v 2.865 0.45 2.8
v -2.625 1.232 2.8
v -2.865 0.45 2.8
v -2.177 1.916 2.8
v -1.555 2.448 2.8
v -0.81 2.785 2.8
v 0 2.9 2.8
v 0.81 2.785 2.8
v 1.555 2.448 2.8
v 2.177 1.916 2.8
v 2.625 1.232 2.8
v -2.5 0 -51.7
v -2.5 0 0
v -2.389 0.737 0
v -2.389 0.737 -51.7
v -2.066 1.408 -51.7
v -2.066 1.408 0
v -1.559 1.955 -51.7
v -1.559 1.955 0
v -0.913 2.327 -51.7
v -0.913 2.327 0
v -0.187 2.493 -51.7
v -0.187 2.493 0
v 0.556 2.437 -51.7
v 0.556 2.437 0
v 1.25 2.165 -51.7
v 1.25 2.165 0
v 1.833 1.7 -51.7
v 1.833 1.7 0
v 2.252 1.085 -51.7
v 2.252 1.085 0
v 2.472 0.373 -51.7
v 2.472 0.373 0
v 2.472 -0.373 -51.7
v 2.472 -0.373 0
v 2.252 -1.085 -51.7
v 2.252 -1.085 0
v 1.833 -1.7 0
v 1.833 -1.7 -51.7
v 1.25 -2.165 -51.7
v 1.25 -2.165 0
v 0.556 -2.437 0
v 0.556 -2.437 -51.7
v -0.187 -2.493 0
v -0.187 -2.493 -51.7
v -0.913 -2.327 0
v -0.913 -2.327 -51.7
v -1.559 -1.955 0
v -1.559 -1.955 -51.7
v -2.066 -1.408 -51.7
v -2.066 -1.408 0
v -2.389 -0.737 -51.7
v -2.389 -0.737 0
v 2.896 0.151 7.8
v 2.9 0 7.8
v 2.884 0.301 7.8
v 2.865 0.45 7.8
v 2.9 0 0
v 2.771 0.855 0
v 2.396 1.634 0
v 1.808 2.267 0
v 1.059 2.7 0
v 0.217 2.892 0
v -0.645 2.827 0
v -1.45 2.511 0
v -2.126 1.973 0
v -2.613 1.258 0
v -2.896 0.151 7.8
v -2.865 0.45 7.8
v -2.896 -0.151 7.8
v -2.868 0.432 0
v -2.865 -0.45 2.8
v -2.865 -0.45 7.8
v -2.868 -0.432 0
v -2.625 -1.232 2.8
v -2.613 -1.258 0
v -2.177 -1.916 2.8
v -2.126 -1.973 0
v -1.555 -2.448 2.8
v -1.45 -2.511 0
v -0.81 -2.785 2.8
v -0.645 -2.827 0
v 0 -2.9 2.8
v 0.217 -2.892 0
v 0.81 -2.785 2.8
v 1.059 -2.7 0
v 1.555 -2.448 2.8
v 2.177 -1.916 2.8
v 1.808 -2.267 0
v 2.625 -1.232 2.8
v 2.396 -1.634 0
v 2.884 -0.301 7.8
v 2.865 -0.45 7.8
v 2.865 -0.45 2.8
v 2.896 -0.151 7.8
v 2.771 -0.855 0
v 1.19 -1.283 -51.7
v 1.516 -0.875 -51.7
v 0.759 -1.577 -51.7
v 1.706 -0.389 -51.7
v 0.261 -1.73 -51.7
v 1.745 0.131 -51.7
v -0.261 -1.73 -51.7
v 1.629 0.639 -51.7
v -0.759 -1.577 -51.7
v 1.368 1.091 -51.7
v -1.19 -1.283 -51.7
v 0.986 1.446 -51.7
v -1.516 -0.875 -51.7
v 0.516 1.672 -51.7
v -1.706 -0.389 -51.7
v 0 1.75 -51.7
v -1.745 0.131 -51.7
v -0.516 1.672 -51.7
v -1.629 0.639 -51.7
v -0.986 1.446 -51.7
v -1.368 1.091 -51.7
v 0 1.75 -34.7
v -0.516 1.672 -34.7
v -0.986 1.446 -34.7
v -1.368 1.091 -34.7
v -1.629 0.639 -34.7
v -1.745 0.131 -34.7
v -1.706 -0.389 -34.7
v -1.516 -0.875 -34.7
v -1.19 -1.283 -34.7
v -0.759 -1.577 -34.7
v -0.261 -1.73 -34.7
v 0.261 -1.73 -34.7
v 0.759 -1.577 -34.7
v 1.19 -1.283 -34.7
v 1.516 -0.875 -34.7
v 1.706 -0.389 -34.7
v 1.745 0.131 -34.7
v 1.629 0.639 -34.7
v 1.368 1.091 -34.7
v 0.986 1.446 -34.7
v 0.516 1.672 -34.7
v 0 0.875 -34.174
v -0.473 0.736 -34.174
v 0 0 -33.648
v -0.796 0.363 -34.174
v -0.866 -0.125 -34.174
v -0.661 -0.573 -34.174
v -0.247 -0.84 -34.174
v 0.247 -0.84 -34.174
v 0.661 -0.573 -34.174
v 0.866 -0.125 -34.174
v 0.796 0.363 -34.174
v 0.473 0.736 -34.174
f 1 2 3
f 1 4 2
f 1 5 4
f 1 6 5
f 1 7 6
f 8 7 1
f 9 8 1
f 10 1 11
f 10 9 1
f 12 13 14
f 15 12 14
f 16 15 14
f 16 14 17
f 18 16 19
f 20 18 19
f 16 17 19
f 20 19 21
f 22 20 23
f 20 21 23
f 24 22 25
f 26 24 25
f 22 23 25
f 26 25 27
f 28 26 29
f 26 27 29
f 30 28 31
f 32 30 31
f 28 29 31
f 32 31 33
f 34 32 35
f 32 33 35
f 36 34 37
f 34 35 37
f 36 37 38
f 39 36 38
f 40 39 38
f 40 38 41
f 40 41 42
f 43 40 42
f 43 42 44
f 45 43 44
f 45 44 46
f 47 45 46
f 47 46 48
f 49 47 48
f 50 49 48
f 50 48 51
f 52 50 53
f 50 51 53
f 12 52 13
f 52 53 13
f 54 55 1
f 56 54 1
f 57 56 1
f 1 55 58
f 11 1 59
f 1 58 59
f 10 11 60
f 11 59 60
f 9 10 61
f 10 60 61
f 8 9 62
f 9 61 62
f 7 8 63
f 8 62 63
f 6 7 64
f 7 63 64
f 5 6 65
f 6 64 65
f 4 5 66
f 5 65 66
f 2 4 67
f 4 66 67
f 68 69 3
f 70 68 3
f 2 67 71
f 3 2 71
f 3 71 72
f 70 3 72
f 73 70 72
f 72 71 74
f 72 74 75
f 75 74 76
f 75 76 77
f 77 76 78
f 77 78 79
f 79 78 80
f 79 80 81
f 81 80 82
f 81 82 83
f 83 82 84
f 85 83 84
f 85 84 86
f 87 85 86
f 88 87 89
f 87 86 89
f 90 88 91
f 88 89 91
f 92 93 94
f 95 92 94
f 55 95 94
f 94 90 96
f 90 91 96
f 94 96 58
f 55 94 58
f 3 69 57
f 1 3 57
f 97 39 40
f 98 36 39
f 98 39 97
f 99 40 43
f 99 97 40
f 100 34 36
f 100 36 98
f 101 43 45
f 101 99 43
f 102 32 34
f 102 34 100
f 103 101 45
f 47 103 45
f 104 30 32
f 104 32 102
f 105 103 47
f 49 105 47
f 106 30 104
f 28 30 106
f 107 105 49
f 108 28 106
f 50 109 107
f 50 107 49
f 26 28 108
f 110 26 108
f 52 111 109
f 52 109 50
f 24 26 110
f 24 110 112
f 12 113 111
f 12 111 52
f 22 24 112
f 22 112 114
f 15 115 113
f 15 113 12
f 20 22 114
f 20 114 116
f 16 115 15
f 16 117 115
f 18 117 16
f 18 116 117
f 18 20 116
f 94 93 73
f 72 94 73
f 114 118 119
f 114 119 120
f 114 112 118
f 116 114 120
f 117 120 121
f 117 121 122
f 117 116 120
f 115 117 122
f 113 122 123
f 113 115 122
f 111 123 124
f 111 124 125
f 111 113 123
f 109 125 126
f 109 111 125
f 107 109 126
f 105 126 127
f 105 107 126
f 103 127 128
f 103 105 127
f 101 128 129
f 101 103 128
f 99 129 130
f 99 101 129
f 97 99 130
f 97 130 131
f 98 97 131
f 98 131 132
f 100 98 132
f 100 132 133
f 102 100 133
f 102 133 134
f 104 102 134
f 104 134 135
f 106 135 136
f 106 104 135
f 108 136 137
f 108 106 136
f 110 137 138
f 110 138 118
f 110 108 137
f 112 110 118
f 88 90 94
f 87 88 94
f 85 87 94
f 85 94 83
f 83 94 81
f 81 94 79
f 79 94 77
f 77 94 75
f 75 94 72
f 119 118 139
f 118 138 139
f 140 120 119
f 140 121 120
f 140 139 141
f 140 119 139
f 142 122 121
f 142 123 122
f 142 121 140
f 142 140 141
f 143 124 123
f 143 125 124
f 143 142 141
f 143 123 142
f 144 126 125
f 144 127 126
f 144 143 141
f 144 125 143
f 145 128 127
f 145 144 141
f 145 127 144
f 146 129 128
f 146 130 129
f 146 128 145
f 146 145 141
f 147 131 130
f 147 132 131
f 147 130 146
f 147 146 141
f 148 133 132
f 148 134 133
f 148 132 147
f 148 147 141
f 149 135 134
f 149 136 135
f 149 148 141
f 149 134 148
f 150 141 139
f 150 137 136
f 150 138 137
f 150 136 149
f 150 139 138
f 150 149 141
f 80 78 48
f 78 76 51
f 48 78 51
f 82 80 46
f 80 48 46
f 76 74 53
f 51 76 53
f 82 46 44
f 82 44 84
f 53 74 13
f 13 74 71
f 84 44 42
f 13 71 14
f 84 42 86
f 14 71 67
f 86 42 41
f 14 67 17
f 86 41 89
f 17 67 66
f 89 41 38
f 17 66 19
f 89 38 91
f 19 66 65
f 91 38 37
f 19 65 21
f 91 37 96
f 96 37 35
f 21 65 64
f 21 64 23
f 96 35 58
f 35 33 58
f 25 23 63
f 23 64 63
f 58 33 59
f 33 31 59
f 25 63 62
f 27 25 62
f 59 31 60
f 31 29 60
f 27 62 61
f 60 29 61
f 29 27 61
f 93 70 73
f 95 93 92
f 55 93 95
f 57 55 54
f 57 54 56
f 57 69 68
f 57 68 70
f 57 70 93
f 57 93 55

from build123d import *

# Parameters (mm, degrees)
SZKIC1_R                    = 2.9
DODANIE_WYCI_GNI_CIE1_DEPTH = 7.8
WYTNIJ_WYCI_GNI_CIE1_DEPTH  = 5
SZKIC3_R                    = 2.5
DODANIE_WYCI_GNI_CIE2_DEPTH = 51.7


with BuildPart() as part:
    # Szkic1 → Dodanie-wyciągnięcie1 (new body)
    with BuildSketch(Plane.XY):
        Circle(SZKIC1_R)
    extrude(amount=DODANIE_WYCI_GNI_CIE1_DEPTH)

    # Szkic2 → Wytnij-wyciągnięcie1 (cut)
    with BuildSketch(Plane.XY.offset(7.8)):
        Polygon((0, -0.45), (2.86487347, -0.45), (2.86487347, -2.9), (-2.9, -2.9), (-2.9, -0.45), align=None)
        Polygon((0, 0.45), (2.86487347, 0.45), (2.86487347, 2.9), (-3.305563266, 2.9), (-3.305563266, 0.45), align=None)
    extrude(amount=-WYTNIJ_WYCI_GNI_CIE1_DEPTH, mode=Mode.SUBTRACT)

    # Szkic3 → Dodanie-wyciągnięcie2 (add)
    with BuildSketch(Plane(origin=(0, 0, 0), x_dir=(-1, 0, 0), z_dir=(0, 0, -1))):
        Circle(SZKIC3_R)
    extrude(amount=DODANIE_WYCI_GNI_CIE2_DEPTH)

    # Szkic7 → Otwór Ø3.5 (3.5)2 (revolve, cut)
    with BuildSketch(Plane(origin=(0, 0, -51.7), x_dir=(0, 1, 0), z_dir=(1, 0, 0))):
        Polygon((0, 0), (0, 18.051506083), (1.75, 17), (1.75, 0), align=None)
    revolve(axis=Axis((0, 0, -58.05), (0, 0, 1)), mode=Mode.SUBTRACT)


solid = part.part
